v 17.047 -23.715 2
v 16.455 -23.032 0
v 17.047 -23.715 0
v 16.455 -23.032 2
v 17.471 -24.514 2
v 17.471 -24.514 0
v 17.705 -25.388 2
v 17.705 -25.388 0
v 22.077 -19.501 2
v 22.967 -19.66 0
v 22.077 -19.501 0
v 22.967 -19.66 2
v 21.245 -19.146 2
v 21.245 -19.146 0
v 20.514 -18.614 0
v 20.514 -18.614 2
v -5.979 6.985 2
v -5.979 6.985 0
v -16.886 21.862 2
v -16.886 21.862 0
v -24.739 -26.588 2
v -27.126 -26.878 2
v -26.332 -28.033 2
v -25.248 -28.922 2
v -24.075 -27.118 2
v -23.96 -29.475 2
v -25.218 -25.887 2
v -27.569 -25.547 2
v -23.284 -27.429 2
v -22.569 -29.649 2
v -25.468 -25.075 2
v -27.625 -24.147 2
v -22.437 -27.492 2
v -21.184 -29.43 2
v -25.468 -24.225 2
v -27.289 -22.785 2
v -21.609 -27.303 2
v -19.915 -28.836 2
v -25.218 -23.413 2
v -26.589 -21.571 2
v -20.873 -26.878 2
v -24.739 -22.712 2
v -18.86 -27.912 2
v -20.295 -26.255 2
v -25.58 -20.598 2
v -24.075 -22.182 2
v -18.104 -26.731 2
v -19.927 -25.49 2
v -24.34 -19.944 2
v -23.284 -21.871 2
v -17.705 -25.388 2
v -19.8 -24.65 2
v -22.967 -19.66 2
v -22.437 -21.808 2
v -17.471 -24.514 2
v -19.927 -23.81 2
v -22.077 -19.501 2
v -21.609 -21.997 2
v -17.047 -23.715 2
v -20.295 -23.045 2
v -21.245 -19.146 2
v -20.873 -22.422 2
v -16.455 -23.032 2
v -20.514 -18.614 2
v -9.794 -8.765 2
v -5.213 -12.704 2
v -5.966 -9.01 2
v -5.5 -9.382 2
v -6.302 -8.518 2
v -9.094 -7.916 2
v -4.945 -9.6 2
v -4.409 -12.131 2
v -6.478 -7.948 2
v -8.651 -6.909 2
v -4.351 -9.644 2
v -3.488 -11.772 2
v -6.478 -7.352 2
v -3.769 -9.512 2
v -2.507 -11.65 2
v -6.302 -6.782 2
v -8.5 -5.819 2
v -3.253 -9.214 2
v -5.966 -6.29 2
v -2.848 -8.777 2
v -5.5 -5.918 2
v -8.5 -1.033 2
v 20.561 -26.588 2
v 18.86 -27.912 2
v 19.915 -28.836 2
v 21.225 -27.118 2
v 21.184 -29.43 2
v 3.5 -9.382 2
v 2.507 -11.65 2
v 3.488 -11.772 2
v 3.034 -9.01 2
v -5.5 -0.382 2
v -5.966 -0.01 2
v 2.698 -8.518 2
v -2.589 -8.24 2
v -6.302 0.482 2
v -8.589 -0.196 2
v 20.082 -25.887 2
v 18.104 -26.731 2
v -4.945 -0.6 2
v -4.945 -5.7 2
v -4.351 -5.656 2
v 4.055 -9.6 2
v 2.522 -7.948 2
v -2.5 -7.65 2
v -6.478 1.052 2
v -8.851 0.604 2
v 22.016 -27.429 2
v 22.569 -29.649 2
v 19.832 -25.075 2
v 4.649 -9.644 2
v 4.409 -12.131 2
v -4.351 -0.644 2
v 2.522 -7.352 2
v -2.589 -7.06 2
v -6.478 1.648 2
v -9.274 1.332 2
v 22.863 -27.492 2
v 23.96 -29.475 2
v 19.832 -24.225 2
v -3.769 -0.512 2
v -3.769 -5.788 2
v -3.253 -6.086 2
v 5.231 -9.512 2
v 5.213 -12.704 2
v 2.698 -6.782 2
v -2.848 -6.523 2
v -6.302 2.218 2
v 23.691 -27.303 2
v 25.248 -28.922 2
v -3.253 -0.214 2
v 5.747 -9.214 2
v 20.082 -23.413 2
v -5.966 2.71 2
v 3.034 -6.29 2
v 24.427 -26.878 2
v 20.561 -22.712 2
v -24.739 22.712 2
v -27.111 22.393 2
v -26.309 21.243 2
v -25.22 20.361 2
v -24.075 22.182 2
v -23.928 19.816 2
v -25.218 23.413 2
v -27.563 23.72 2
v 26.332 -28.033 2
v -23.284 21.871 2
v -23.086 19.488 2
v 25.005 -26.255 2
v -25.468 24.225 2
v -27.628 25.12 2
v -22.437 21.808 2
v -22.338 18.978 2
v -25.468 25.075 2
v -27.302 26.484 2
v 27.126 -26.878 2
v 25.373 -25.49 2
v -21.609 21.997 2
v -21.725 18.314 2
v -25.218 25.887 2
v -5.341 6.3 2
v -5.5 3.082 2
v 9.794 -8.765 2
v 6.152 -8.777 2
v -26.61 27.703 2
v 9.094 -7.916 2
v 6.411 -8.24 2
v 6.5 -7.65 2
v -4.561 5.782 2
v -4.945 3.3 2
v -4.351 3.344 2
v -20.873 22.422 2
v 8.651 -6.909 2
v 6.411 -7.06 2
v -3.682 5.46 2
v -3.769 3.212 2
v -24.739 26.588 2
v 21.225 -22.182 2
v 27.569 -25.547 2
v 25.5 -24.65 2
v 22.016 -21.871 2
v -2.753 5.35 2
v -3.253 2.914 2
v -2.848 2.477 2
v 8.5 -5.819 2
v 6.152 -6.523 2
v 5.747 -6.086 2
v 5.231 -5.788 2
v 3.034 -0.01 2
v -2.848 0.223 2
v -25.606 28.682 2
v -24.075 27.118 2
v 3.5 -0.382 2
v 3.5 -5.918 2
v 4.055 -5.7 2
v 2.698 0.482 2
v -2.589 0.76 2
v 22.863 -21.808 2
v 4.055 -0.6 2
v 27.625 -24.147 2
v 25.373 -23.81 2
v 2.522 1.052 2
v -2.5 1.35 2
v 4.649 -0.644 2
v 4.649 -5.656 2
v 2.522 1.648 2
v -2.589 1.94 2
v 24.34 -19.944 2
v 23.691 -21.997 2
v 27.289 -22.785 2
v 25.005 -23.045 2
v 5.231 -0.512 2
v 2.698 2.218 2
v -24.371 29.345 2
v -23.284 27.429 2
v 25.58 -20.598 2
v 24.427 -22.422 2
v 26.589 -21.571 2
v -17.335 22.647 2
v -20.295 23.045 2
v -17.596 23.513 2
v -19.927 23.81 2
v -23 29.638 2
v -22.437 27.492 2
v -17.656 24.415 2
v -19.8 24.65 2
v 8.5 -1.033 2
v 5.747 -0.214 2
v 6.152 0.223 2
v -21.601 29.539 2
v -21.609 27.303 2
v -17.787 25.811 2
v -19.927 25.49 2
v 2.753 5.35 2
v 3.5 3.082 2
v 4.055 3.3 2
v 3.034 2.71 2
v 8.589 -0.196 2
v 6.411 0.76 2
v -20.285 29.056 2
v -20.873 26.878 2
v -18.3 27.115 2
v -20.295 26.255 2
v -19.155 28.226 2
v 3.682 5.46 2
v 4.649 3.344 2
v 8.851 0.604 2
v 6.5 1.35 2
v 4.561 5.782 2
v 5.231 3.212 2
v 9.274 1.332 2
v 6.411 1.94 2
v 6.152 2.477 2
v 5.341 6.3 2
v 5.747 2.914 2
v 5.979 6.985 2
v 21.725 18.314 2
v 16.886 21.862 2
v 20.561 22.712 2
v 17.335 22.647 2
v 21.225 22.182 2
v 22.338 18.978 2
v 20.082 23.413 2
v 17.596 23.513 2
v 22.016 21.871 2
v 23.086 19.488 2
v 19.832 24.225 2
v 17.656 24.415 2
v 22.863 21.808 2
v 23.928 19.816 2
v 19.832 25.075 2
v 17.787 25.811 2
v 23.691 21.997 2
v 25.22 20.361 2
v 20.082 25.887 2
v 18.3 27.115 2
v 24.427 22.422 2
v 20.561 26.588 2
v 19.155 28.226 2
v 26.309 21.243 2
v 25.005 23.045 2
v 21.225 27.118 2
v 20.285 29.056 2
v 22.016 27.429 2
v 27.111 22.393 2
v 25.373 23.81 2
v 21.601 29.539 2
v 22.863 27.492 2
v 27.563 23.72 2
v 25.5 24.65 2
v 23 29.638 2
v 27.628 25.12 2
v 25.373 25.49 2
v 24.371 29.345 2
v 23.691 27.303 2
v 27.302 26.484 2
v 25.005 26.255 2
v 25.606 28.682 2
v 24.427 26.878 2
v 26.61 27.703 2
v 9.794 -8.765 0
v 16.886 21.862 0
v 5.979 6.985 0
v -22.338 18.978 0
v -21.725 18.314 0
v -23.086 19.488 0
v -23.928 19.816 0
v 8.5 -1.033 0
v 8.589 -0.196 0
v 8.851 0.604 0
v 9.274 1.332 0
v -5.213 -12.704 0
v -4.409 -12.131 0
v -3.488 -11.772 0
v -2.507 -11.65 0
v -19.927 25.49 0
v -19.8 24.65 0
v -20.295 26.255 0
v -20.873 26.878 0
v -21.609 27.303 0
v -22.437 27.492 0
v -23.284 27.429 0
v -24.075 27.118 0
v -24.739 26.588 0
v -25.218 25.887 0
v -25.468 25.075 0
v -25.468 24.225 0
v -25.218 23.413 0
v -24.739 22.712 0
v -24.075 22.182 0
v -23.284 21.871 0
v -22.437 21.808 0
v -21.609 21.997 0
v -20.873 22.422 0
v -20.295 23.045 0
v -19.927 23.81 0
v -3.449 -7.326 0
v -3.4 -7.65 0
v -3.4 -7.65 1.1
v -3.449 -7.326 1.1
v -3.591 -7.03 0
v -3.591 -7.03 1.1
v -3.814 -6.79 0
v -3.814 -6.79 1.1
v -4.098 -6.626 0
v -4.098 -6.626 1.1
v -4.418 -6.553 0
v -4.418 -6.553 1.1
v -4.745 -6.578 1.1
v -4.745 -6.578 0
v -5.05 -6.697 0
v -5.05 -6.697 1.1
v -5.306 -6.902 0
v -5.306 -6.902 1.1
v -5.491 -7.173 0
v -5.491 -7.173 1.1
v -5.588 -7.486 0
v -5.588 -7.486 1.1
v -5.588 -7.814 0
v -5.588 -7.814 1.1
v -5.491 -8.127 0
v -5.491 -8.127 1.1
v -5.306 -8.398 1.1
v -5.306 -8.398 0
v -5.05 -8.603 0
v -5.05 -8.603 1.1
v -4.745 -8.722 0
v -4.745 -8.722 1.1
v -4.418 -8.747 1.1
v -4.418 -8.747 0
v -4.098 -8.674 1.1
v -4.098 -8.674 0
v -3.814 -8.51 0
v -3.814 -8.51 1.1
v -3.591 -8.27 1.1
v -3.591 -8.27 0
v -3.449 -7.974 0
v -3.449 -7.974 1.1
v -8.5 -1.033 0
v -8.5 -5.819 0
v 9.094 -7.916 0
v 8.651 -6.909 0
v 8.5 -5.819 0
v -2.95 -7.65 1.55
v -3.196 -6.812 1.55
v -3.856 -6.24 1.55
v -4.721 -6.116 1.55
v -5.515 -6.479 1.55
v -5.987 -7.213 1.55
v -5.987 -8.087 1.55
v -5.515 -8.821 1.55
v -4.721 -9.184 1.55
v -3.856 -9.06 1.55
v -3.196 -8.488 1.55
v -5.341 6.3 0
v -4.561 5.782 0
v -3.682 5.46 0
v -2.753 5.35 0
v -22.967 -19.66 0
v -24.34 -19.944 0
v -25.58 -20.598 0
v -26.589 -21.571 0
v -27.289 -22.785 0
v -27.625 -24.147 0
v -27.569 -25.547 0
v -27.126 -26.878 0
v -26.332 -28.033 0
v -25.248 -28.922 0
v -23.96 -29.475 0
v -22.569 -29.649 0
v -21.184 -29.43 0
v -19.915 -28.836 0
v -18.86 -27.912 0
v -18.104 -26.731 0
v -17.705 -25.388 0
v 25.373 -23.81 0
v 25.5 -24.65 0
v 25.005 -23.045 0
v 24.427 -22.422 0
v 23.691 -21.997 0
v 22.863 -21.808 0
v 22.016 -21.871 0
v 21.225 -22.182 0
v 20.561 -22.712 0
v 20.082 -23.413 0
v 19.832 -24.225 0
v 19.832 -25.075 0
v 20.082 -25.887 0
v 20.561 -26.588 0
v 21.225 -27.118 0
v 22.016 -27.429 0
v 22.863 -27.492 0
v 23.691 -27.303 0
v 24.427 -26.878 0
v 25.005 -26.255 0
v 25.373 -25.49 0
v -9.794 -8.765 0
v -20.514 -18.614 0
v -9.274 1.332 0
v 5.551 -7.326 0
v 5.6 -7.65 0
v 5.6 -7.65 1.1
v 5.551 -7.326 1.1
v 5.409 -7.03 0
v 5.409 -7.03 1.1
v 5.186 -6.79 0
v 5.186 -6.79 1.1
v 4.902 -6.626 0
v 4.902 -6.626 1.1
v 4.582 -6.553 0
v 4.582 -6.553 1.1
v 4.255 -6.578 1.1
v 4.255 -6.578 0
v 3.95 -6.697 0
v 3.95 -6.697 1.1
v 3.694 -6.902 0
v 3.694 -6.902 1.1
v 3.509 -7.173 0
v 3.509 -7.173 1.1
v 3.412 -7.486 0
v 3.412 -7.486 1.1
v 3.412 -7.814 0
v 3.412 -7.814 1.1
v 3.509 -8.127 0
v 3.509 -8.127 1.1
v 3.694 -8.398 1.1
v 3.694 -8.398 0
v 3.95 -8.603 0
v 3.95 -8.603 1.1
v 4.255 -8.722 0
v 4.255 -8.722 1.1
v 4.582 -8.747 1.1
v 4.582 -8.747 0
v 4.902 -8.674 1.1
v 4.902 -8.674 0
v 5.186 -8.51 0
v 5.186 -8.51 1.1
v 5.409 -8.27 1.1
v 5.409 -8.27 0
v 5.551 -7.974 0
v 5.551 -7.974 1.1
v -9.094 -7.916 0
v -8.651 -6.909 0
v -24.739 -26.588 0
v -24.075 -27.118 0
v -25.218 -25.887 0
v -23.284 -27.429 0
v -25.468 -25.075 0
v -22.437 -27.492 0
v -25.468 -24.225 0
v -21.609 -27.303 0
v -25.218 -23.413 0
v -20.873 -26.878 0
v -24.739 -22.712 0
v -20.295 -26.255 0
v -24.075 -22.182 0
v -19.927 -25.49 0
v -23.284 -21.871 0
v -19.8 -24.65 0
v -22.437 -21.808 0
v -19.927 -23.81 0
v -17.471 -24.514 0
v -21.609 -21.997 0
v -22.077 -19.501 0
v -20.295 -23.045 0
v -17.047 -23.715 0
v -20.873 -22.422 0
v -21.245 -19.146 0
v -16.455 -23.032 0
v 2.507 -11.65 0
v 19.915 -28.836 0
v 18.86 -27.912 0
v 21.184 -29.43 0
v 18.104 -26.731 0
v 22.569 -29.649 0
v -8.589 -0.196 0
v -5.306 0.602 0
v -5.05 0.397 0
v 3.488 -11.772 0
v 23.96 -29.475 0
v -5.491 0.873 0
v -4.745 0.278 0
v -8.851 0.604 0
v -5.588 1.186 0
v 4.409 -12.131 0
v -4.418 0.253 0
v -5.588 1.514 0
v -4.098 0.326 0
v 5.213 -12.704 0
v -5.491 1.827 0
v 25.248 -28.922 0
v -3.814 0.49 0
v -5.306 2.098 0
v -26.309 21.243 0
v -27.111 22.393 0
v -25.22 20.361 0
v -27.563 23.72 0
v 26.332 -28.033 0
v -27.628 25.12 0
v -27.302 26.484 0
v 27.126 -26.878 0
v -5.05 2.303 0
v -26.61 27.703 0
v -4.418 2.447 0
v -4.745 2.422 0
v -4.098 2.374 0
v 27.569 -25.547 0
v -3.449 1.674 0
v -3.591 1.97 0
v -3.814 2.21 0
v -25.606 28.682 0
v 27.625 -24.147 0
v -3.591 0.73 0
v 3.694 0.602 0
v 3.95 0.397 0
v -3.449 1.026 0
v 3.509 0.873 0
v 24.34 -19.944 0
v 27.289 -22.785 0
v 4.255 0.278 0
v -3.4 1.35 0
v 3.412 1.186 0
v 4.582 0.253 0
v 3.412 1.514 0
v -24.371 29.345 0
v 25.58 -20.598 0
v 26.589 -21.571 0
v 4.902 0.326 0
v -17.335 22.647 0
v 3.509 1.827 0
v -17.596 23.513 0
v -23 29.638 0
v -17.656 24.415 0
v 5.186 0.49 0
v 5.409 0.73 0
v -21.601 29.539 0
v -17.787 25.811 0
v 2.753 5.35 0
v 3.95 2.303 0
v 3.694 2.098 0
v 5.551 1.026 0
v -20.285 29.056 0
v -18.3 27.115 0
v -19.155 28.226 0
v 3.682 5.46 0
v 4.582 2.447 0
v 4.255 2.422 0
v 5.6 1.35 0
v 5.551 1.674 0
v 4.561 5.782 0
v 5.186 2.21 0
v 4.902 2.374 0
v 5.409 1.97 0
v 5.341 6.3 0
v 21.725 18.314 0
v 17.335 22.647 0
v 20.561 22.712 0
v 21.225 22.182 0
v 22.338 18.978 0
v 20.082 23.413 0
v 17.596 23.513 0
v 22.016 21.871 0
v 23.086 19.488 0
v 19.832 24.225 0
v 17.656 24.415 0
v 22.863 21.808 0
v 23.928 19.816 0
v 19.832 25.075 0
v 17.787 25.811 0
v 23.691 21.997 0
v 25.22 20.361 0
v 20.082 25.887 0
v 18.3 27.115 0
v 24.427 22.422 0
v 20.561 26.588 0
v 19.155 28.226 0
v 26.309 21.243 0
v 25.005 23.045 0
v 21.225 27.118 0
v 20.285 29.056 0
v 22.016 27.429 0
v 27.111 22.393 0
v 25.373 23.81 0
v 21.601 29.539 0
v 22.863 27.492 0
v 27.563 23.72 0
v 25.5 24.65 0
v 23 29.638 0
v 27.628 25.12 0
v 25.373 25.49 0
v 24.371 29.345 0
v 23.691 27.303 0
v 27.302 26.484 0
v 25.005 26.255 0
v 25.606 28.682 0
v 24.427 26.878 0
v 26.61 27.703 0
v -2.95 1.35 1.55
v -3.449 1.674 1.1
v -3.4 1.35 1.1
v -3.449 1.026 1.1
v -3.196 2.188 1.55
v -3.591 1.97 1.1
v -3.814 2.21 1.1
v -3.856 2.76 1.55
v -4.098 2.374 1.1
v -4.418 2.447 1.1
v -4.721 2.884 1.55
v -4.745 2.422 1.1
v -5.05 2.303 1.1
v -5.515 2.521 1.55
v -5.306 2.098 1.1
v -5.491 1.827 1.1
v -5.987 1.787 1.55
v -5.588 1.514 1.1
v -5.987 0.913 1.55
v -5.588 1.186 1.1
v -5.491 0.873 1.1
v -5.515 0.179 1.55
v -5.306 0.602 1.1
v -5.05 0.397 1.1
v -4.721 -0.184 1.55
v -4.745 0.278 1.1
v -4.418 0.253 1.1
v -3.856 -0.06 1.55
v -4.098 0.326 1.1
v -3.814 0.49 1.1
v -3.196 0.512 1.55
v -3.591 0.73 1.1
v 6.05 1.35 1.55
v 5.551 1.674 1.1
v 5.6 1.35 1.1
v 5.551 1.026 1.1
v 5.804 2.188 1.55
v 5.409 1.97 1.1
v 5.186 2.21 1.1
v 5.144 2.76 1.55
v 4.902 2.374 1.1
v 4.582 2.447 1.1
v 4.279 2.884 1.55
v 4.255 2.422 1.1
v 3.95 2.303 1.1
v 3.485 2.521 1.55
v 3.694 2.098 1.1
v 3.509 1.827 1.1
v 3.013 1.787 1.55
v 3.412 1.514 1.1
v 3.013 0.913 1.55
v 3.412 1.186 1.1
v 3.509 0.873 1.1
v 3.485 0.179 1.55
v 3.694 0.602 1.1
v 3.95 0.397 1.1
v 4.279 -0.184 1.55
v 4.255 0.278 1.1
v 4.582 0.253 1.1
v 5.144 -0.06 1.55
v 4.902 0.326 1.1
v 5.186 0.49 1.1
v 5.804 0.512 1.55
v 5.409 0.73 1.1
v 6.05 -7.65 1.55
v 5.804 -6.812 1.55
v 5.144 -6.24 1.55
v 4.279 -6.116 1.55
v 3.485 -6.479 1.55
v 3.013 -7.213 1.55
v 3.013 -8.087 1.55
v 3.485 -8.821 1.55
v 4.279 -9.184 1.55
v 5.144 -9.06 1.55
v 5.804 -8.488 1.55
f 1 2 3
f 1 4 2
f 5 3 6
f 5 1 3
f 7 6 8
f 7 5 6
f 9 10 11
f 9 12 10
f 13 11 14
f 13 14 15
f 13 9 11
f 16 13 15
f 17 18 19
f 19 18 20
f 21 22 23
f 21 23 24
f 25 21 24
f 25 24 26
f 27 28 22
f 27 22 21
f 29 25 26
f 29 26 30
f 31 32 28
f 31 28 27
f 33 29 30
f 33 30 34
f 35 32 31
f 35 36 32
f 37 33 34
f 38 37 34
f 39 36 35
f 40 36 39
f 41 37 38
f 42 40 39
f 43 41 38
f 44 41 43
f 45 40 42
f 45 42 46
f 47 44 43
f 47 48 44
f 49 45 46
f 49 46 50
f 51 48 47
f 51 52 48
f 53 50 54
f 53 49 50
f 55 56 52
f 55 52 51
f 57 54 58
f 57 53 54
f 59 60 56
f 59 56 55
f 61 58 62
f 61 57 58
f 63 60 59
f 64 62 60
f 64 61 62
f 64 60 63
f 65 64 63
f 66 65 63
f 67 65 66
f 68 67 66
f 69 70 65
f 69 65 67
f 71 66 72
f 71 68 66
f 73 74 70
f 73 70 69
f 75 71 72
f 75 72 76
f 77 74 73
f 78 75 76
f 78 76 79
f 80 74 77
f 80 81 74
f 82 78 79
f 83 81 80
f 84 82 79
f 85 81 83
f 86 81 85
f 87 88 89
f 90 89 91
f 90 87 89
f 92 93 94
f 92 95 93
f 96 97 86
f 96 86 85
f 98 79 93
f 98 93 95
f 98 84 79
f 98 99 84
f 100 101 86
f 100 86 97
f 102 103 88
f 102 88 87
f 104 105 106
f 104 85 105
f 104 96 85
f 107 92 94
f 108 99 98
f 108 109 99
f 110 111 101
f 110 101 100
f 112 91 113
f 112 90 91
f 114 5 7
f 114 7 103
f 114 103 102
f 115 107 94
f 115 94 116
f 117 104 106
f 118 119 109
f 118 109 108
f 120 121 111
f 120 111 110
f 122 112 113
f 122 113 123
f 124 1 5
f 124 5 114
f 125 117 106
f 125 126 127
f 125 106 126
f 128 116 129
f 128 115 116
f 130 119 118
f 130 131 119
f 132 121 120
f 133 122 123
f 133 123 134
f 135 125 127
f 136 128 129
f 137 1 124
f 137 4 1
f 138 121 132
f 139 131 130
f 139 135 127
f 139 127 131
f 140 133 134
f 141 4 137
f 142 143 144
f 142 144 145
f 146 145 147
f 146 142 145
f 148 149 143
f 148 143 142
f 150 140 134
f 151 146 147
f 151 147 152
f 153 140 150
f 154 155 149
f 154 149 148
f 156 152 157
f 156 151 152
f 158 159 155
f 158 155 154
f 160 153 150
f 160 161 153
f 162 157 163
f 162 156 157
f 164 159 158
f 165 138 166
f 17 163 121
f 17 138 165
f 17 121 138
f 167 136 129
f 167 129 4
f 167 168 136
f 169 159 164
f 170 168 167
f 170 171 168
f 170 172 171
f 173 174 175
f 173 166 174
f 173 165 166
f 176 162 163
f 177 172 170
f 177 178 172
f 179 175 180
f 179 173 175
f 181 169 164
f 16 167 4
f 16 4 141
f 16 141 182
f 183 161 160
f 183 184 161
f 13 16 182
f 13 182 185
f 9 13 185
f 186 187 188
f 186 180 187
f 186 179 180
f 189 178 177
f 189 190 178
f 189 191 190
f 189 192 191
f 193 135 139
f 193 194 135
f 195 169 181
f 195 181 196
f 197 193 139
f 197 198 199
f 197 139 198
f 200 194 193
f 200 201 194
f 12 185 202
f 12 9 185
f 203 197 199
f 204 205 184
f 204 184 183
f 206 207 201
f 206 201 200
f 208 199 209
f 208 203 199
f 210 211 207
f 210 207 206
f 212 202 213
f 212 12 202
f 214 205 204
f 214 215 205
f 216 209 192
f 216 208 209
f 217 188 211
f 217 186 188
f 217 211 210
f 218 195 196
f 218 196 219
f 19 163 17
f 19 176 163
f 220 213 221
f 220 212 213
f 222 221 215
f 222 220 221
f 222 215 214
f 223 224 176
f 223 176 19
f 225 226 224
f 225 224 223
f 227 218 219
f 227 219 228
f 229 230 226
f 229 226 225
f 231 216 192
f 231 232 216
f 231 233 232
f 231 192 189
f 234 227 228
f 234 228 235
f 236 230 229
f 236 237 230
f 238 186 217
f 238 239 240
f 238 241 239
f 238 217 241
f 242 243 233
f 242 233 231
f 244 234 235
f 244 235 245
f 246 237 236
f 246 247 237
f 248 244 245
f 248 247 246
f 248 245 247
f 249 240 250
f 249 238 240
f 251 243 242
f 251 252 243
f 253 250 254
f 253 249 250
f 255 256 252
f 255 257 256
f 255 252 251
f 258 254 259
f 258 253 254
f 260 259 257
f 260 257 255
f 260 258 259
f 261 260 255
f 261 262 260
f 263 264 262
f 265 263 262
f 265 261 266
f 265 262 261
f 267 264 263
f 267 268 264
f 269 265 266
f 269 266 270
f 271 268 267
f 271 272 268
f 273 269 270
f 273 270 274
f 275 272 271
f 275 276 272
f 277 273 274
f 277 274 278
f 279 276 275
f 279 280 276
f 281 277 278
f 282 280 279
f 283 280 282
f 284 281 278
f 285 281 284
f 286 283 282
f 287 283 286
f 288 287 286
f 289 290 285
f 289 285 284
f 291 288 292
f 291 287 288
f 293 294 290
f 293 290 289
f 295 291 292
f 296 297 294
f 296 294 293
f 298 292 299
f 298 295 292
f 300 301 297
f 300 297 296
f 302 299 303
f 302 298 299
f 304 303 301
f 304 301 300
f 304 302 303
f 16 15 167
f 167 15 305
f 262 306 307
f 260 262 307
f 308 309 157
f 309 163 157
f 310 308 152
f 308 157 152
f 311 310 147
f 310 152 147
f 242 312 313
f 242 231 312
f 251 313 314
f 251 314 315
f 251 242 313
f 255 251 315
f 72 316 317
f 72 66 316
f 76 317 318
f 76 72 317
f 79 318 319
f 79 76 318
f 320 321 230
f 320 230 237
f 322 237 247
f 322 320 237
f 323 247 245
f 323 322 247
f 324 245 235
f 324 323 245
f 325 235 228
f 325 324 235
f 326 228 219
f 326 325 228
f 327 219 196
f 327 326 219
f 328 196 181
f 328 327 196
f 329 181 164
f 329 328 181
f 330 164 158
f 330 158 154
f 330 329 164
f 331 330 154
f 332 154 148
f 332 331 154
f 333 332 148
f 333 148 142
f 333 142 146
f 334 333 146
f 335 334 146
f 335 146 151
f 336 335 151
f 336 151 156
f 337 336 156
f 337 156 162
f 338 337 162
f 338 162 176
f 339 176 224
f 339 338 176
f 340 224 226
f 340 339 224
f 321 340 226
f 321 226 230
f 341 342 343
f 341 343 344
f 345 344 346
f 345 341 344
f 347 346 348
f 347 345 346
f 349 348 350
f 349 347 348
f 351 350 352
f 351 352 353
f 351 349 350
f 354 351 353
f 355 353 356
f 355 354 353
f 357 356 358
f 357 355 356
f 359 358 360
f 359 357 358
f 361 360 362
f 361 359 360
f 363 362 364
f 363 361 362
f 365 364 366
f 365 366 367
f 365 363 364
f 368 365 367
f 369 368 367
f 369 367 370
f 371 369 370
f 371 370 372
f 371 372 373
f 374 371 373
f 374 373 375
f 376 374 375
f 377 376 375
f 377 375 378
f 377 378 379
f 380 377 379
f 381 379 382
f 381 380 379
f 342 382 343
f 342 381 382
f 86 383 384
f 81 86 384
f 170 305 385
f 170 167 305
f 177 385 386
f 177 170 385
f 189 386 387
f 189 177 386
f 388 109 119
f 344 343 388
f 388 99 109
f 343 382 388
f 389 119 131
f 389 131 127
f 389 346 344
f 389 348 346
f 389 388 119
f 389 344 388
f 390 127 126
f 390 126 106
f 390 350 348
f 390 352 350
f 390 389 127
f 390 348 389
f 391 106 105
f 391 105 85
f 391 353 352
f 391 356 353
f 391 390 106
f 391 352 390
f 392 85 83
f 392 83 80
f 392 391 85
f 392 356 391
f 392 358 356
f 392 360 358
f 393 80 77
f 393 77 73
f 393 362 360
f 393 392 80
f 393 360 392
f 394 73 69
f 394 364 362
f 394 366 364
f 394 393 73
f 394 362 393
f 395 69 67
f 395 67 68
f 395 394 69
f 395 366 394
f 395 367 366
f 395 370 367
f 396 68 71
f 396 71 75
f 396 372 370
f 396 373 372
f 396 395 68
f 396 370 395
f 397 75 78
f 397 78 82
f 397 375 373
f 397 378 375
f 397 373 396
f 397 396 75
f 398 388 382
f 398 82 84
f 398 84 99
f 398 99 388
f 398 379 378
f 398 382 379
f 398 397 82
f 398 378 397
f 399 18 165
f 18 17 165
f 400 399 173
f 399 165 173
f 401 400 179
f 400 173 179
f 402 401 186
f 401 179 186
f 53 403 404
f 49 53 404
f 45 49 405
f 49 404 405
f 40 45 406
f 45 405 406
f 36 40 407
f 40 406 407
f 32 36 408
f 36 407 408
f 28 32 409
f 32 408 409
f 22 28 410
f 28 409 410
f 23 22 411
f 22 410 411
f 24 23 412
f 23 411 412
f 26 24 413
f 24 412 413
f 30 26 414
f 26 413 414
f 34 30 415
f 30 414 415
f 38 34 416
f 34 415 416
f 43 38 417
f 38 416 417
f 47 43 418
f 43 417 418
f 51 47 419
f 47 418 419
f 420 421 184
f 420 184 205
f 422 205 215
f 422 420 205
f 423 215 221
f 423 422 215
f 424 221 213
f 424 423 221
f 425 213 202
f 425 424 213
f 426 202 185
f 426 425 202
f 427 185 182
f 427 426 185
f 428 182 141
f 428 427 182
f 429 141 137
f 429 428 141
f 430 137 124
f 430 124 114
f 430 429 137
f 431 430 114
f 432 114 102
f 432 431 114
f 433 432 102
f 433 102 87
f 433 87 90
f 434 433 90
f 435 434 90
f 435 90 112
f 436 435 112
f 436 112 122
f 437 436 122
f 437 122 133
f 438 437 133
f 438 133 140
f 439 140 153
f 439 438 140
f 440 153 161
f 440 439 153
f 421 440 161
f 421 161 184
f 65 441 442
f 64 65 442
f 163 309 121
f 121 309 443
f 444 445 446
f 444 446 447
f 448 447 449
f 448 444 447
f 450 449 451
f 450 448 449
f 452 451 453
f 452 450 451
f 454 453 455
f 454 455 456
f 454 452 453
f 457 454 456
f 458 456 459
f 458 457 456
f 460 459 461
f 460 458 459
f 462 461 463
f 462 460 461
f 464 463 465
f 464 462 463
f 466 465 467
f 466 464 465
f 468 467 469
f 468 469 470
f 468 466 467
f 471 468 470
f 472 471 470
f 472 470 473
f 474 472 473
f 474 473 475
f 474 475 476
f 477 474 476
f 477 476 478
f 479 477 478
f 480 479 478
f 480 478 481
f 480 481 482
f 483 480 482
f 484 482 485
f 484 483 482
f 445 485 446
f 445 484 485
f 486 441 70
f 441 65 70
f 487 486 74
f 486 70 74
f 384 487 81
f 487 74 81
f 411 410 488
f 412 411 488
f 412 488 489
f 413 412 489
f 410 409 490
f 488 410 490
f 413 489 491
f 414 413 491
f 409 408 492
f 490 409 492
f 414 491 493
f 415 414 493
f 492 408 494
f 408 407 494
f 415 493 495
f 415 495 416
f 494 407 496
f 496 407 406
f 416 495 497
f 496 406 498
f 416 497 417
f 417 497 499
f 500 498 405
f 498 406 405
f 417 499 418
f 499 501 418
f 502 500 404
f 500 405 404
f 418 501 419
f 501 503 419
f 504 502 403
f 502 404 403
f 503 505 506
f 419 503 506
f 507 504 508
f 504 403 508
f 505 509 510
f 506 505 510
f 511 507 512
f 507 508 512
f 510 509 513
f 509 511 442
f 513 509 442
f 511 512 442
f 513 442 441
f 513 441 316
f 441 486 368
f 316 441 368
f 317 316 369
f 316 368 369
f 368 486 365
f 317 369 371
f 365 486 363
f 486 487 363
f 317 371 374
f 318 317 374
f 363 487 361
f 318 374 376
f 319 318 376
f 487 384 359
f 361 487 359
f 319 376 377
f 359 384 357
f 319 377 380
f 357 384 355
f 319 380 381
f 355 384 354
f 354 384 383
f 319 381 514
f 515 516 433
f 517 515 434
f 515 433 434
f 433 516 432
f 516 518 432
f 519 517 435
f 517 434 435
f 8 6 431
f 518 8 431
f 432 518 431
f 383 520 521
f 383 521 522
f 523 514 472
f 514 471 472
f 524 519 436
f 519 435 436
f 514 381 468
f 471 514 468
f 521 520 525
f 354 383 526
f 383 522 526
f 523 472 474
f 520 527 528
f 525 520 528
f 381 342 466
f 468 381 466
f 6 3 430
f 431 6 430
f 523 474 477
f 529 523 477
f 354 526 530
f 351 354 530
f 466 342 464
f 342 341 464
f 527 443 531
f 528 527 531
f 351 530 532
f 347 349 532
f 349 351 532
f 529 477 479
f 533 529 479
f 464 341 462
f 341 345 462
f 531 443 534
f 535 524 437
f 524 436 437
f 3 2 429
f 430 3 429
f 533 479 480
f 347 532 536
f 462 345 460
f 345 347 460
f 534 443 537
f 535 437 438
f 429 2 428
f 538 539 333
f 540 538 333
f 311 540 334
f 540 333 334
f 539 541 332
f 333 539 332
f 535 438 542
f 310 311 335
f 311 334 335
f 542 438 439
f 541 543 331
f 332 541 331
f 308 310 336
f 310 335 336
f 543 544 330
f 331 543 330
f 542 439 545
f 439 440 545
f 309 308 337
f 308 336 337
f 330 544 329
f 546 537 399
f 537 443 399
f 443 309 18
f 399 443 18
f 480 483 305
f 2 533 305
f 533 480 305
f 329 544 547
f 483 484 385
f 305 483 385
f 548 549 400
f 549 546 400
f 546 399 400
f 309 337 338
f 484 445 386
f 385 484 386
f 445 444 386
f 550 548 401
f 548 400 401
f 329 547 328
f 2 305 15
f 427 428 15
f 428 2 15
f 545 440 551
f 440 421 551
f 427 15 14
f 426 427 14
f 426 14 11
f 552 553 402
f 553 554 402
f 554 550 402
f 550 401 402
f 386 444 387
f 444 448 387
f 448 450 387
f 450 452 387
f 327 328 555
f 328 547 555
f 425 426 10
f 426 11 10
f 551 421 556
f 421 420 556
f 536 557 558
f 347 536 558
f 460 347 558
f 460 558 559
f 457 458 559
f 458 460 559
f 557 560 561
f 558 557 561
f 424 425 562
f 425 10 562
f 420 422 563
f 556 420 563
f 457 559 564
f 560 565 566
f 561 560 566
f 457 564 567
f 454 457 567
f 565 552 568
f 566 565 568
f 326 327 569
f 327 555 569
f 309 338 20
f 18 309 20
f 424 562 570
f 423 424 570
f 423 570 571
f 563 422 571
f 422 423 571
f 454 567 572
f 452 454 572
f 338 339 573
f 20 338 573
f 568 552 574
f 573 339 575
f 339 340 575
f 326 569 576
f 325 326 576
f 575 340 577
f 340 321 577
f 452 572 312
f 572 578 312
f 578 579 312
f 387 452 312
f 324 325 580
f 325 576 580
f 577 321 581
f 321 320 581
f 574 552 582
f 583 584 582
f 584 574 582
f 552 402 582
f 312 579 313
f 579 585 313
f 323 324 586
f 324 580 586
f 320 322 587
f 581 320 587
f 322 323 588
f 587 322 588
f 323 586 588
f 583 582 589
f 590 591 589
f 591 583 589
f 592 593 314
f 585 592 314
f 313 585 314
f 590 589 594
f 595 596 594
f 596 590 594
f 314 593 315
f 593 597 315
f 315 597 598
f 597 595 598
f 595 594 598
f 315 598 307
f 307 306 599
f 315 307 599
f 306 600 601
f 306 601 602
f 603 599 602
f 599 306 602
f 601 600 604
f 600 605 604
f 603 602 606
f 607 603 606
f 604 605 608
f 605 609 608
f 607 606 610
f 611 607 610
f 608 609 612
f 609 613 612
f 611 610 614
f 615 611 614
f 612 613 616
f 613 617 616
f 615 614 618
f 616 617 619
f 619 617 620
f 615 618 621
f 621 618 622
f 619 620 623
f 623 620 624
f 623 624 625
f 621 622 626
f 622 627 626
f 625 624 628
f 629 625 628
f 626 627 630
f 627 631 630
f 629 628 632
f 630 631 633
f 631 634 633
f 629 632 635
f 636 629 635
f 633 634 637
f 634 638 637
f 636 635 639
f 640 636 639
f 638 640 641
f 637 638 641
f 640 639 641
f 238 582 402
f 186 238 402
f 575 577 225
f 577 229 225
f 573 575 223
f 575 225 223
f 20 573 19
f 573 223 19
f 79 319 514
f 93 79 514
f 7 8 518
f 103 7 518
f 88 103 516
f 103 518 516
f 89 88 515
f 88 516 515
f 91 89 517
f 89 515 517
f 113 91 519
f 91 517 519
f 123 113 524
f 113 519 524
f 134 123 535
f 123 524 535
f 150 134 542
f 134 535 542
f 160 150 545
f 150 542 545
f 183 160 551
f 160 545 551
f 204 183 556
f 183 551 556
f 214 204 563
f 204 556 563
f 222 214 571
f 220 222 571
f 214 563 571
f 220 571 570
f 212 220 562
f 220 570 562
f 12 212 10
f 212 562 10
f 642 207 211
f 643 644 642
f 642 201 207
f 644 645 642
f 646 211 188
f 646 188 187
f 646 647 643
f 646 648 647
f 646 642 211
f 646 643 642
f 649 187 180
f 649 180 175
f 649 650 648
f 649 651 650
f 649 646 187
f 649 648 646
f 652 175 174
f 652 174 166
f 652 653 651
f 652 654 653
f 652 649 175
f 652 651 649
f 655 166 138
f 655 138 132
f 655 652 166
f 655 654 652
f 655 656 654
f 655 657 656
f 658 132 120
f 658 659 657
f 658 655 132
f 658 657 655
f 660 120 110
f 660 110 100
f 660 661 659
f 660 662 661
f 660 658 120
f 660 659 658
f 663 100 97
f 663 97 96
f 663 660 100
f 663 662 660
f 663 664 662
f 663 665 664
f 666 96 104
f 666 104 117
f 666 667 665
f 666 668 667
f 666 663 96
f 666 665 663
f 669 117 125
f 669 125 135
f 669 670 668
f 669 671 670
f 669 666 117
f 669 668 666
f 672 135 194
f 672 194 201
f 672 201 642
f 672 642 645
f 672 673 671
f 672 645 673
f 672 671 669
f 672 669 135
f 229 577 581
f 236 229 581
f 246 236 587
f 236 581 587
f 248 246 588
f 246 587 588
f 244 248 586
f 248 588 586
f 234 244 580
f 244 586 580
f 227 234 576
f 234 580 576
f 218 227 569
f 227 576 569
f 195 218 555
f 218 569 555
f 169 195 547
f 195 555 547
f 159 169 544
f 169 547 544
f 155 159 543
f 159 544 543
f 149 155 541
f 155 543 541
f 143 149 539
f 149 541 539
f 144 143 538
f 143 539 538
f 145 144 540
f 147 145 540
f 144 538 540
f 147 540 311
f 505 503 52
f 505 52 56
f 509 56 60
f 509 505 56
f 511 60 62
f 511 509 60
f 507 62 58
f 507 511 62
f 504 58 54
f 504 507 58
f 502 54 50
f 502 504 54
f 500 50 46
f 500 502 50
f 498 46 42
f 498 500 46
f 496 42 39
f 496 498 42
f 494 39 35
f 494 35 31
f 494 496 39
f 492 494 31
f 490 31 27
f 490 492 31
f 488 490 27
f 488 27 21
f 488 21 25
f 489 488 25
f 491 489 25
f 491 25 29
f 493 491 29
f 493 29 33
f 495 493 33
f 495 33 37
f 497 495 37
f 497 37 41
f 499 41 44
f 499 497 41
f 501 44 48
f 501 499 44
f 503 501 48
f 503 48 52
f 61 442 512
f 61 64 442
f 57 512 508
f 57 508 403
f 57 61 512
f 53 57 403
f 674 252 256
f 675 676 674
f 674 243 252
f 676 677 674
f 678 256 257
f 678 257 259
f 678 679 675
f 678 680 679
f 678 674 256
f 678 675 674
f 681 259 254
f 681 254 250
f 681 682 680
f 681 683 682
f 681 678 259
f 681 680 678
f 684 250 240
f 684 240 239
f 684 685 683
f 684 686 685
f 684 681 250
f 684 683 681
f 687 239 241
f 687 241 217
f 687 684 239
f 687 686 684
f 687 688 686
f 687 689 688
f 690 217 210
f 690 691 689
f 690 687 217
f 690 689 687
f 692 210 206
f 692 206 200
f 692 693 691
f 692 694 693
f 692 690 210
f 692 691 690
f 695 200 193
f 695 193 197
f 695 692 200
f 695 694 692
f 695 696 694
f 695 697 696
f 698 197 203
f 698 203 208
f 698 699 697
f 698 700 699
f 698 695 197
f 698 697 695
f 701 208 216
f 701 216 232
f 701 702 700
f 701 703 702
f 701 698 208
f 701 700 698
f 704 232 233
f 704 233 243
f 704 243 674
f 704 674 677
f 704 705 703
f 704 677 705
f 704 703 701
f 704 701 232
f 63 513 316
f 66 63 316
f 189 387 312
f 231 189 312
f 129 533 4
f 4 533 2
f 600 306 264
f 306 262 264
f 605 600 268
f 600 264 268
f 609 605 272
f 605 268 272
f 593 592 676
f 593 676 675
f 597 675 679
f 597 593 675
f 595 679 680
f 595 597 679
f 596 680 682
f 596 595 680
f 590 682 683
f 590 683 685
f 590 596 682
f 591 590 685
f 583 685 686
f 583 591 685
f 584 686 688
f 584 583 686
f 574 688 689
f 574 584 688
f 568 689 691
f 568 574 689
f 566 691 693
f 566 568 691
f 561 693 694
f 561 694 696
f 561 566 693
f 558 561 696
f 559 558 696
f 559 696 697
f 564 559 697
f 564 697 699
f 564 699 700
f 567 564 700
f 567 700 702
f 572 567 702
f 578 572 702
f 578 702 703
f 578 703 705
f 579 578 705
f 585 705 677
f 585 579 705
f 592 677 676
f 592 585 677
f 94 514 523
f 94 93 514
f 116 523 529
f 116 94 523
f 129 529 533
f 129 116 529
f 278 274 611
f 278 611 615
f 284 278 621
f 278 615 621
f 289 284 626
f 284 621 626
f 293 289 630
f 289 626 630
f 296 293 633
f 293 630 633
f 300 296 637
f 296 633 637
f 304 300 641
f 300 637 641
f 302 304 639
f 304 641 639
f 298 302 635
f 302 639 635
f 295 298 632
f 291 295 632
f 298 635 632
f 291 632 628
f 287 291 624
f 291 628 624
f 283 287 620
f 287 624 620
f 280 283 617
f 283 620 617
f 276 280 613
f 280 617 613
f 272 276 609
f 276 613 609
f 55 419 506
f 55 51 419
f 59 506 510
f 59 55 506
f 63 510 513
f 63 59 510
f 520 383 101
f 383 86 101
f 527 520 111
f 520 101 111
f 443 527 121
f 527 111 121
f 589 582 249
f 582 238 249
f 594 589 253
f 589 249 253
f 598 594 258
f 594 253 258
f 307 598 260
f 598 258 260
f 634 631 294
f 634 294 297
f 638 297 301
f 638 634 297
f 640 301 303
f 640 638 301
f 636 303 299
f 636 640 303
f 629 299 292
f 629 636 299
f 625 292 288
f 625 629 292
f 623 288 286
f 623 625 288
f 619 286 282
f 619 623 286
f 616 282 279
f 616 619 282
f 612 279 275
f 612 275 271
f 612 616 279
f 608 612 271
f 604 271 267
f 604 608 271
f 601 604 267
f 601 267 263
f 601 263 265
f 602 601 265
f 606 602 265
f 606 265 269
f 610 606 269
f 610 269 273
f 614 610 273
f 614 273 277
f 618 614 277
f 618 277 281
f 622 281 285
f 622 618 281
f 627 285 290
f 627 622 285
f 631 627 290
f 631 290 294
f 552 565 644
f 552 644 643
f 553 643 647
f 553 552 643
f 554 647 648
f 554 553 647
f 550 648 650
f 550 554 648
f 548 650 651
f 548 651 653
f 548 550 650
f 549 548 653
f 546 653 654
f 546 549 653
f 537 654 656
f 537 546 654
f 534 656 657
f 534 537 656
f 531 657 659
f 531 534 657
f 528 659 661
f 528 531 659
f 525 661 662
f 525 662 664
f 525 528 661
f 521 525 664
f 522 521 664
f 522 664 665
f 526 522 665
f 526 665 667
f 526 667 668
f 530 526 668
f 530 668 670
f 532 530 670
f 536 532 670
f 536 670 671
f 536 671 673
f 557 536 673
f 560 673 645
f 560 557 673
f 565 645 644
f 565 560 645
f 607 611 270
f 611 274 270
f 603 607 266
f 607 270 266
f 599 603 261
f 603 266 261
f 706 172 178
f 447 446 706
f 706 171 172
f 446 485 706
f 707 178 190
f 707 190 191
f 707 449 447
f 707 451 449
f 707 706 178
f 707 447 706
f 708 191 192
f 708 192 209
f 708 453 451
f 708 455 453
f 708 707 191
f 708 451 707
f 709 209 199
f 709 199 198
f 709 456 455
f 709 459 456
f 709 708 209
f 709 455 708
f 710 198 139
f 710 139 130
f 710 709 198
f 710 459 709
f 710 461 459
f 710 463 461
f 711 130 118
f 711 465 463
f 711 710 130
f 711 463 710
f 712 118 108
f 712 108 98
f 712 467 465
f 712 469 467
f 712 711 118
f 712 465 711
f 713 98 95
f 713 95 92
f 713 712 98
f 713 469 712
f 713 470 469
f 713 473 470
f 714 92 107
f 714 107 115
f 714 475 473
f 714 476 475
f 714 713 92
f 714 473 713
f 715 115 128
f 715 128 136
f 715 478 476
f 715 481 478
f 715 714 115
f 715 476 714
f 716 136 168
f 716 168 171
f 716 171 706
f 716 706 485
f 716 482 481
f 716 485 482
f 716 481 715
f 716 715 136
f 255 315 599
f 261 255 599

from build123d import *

# Parameters (mm, degrees)
F1_R     = 2.85
F1_R_2   = 1.1
F2_DEPTH = 2
F3_R     = 4
F4_SIZE  = 0.9


with BuildPart() as f2:
    # F1 (on Top) → F2 (new body)
    with BuildSketch(Plane.XY):
        with BuildLine():
            Line((-8.5, -7.576114), (-21.734057, -19.734611))
            ThreePointArc((-21.734057, -19.734611), (-26.331988, -28.032745), (-17.674763, -24.152997))
            Line((-17.674763, -24.152997), (-4.065732, -11.65))
            Line((-4.065732, -11.65), (4.065732, -11.65))
            Line((4.065732, -11.65), (17.674763, -24.152997))
            ThreePointArc((17.674763, -24.152997), (26.331988, -28.032745), (21.734057, -19.734611))
            Line((21.734057, -19.734611), (8.5, -7.576114))
            Line((8.5, -7.576114), (8.5, 0.276202))
            Line((8.5, 0.276202), (22.704322, 19.650295))
            ThreePointArc((22.704322, 19.650295), (25.606365, 28.682357), (17.865493, 23.197934))
            Line((17.865493, 23.197934), (4.780091, 5.35))
            Line((4.780091, 5.35), (-4.780091, 5.35))
            Line((-4.780091, 5.35), (-17.865493, 23.197934))
            ThreePointArc((-17.865493, 23.197934), (-25.606365, 28.682357), (-22.704322, 19.650295))
            Line((-22.704322, 19.650295), (-8.5, 0.276202))
            Line((-8.5, 0.276202), (-8.5, -7.576114))
        make_face()
        with Locations((-22.65, -24.65)):
            Circle(F1_R, mode=Mode.SUBTRACT)
        with Locations((-4.5, -7.65)):
            Circle(F1_R_2, mode=Mode.SUBTRACT)
        with Locations((22.65, -24.65)):
            Circle(F1_R, mode=Mode.SUBTRACT)
        with Locations((4.5, -7.65)):
            Circle(F1_R_2, mode=Mode.SUBTRACT)
        with Locations((-4.5, 1.35)):
            Circle(F1_R_2, mode=Mode.SUBTRACT)
        with Locations((-22.65, 24.65)):
            Circle(F1_R, mode=Mode.SUBTRACT)
        with Locations((4.5, 1.35)):
            Circle(F1_R_2, mode=Mode.SUBTRACT)
        with Locations((22.65, 24.65)):
            Circle(F1_R, mode=Mode.SUBTRACT)
    extrude(amount=F2_DEPTH)

    # F3
    f3_edges = [f2.edges().sort_by_distance(p)[0] for p in [
        (-22.704322, 19.650295, 1),
        (-8.5, 0.276202, 1),
        (-8.5, -7.576114, 1),
        (-21.734057, -19.734611, 1),
        (-17.674763, -24.152997, 1),
        (-4.065732, -11.65, 1),
        (4.065732, -11.65, 1),
        (17.674763, -24.152997, 1),
        (21.734057, -19.734611, 1),
        (8.5, -7.576114, 1),
        (8.5, 0.276202, 1),
        (22.704322, 19.650295, 1),
        (17.865493, 23.197934, 1),
        (4.780091, 5.35, 1),
        (-4.780091, 5.35, 1),
        (-17.865493, 23.197934, 1),
    ]]
    fillet(f3_edges, radius=F3_R)

    # F4
    f4_edges = [f2.edges().sort_by_distance(p)[0] for p in [
        (-5.6, 1.35, 2),
        (3.4, 1.35, 2),
        (3.4, -7.65, 2),
        (-5.6, -7.65, 2),
    ]]
    chamfer(f4_edges, length=F4_SIZE)


solid = f2.part
